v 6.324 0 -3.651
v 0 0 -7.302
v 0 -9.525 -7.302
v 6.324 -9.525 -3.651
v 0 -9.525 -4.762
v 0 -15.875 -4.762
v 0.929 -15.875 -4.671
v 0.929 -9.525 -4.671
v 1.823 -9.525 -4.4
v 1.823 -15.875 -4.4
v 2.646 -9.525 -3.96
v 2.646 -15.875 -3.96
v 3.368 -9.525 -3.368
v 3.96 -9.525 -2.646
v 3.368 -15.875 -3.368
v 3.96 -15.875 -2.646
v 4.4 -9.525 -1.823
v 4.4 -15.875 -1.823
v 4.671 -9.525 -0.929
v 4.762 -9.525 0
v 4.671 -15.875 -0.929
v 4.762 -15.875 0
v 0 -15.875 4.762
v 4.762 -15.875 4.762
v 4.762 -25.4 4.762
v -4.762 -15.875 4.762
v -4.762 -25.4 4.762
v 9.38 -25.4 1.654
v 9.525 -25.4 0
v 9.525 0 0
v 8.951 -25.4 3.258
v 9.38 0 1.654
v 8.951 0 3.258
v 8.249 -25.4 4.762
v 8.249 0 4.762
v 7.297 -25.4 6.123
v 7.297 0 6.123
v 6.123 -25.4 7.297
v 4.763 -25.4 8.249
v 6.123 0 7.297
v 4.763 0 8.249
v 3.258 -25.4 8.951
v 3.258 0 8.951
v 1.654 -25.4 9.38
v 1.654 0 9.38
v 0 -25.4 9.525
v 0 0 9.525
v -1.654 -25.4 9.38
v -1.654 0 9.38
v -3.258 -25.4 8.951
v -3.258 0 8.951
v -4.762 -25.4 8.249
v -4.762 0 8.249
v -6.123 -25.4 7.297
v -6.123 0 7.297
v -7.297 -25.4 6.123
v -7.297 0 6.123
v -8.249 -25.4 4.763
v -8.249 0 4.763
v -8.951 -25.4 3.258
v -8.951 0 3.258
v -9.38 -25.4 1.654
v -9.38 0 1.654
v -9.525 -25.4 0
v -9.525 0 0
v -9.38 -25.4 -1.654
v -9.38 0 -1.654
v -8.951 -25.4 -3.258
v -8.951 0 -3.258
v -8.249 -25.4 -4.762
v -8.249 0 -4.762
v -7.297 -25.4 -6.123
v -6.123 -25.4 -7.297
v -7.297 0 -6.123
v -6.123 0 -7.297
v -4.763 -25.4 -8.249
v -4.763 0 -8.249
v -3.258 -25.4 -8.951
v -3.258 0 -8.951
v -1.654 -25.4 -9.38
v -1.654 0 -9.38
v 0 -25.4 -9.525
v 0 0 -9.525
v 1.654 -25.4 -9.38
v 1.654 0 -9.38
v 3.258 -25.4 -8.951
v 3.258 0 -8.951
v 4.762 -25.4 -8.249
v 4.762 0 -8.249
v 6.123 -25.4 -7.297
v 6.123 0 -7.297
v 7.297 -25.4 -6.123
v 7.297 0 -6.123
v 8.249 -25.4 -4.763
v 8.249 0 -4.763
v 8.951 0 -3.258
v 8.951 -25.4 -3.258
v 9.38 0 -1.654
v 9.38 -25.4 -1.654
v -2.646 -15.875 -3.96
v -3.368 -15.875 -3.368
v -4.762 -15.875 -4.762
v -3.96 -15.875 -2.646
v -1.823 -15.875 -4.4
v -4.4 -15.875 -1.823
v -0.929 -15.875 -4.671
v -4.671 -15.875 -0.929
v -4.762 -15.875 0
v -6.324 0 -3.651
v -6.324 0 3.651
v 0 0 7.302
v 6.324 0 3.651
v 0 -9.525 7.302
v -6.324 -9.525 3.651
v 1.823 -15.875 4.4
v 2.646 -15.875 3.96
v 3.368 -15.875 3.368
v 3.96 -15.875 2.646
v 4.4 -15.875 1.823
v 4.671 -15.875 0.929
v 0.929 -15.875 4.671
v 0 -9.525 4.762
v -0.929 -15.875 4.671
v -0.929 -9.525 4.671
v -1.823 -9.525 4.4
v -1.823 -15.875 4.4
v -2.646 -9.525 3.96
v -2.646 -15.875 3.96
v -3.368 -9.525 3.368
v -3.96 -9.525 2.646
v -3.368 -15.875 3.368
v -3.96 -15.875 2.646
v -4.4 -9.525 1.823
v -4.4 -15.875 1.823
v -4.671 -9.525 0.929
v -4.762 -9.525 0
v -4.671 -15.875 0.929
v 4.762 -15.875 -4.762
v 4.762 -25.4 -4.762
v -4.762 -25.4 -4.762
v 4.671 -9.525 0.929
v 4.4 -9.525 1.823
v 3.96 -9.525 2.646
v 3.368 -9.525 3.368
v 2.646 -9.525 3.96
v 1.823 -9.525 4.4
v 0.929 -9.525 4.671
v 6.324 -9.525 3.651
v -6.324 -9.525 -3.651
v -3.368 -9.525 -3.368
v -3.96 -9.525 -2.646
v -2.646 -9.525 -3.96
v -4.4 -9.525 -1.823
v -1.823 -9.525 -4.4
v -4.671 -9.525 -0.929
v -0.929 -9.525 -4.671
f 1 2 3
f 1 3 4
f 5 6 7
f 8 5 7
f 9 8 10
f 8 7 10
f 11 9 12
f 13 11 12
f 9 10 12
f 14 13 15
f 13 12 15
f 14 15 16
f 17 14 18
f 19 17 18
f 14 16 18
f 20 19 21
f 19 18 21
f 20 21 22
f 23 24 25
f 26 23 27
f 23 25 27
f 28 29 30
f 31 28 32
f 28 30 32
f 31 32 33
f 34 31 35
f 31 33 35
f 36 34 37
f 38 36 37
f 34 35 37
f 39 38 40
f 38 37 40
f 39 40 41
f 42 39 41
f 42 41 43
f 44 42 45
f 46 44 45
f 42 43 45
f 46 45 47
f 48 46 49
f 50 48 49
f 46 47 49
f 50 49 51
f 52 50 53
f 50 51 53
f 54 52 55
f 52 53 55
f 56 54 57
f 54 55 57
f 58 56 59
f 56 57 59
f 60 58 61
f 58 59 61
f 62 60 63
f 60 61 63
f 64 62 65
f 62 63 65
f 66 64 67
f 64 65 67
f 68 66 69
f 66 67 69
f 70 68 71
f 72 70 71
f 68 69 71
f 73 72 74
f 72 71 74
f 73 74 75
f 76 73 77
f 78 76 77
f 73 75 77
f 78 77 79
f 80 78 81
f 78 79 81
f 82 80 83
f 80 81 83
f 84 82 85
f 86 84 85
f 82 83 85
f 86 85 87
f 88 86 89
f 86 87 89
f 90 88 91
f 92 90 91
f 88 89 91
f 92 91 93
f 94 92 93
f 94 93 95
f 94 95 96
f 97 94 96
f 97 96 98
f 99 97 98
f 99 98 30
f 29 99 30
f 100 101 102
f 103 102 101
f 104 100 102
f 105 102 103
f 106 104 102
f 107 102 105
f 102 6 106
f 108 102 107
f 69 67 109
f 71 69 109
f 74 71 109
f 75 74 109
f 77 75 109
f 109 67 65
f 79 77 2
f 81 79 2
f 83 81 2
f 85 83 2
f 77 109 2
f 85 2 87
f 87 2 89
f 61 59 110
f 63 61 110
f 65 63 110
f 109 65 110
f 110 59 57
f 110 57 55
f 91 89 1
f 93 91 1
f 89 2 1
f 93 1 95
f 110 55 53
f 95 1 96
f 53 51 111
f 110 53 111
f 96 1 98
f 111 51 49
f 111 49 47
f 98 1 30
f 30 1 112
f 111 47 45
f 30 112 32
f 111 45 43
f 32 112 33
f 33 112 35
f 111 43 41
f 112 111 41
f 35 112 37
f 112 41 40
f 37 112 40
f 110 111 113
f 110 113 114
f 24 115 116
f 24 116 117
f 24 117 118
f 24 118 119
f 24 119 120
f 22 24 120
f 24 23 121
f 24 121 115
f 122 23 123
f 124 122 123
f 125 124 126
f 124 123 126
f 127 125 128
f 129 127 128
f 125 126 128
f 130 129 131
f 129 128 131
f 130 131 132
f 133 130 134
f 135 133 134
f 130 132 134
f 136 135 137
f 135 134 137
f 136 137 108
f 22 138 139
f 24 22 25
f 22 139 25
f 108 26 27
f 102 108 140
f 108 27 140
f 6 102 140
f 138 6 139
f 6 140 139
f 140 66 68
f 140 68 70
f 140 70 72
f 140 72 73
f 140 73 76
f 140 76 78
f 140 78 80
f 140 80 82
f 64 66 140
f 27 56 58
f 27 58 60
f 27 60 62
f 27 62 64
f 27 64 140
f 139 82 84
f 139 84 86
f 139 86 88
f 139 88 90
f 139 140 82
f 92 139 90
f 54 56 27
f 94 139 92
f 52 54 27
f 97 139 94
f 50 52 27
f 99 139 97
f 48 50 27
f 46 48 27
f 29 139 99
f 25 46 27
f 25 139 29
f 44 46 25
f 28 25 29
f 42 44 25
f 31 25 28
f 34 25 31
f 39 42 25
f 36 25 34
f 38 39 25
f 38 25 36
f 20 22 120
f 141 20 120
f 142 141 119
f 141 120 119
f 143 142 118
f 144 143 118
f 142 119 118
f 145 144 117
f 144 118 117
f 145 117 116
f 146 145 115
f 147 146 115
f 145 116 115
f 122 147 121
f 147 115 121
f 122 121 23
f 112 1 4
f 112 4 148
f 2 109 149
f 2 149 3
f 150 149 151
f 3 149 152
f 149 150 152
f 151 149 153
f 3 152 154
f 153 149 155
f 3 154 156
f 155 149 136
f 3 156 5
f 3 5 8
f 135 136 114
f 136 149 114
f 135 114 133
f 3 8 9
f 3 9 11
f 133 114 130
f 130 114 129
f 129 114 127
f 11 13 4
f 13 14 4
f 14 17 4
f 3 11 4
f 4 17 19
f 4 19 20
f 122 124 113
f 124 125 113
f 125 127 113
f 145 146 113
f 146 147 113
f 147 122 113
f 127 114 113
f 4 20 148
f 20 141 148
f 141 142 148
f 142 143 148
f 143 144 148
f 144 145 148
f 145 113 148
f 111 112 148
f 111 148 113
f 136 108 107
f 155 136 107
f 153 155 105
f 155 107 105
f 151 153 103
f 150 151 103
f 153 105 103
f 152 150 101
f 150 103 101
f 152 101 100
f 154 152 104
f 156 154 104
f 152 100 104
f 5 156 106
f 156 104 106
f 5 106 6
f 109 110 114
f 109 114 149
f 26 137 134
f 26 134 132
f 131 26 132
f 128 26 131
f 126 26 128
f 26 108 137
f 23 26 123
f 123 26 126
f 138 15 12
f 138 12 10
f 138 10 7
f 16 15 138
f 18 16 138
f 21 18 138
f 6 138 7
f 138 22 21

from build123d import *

# Parameters (mm, degrees)
F0_R     = 9.525
F1_DEPTH = 25.4
F3_DEPTH = 25.401
F4_DEPTH = 9.525
F6_DEPTH = 9.525


with BuildPart() as f1:
    # F0 (on Front) → F1 (new body)
    with BuildSketch(Plane.XZ):
        Circle(F0_R)
    extrude(amount=F1_DEPTH)

    # F2 (on face) → F3 (cut, through all)
    with BuildSketch(Plane.XZ.offset(25.4)):
        with BuildLine():
            ThreePointArc((-4.7625, 0), (-3.367596, -3.367596), (0, -4.7625))
            ThreePointArc((0, -4.7625), (3.367596, -3.367596), (4.7625, 0))
            ThreePointArc((4.7625, 0), (3.367596, 3.367596), (0, 4.7625))
            ThreePointArc((0, 4.7625), (-3.367596, 3.367596), (-4.7625, 0))
        make_face()
    extrude(amount=-F3_DEPTH, mode=Mode.SUBTRACT)

    # F2 (on face) → F4 (cut)
    with BuildSketch(Plane.XZ.offset(25.4)):
        with BuildLine():
            Line((0, -4.7625), (4.7625, -4.7625))
            Line((4.7625, -4.7625), (4.7625, 0))
            ThreePointArc((4.7625, 0), (3.367596, -3.367596), (0, -4.7625))
        make_face()
        with BuildLine():
            Line((-4.7625, -4.7625), (0, -4.7625))
            ThreePointArc((0, -4.7625), (-3.367596, -3.367596), (-4.7625, 0))
            Line((-4.7625, 0), (-4.7625, -4.7625))
        make_face()
        with BuildLine():
            ThreePointArc((0, 4.7625), (3.367596, 3.367596), (4.7625, 0))
            Line((4.7625, 0), (4.7625, 4.7625))
            Line((4.7625, 4.7625), (0, 4.7625))
        make_face()
        with BuildLine():
            Line((-4.7625, 4.7625), (-4.7625, 0))
            ThreePointArc((-4.7625, 0), (-3.367596, 3.367596), (0, 4.7625))
            Line((0, 4.7625), (-4.7625, 4.7625))
        make_face()
    extrude(amount=-F4_DEPTH, mode=Mode.SUBTRACT)

    # F5 (on Front) → F6 (cut)
    with BuildSketch(Plane.XZ):
        Polygon((6.324151, 3.65125), (0, 7.3025), (-6.324151, 3.65125), (-6.324151, -3.65125), (0, -7.3025), (6.324151, -3.65125), align=None)
    extrude(amount=F6_DEPTH, mode=Mode.SUBTRACT)


solid = f1.part
